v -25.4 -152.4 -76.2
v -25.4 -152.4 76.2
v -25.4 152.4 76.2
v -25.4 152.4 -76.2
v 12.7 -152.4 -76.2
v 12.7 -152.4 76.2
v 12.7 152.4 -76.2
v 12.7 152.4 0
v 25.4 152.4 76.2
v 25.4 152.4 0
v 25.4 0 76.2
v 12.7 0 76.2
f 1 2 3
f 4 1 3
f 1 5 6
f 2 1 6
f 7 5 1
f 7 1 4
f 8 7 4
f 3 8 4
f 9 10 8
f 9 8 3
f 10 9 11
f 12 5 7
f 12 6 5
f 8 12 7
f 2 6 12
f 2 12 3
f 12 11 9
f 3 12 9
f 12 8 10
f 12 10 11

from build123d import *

# Parameters (mm, degrees)
F0_W     = 304.8
F0_H     = 152.4
F1_DEPTH = 6.35
F3_DEPTH = 6.35
F5_DEPTH = 25.399999693
F6_DEPTH = 25.4


with BuildPart() as f1:
    # F0 (on Right) → F1 (new body)
    with BuildSketch(Plane.YZ):
        Rectangle(F0_W, F0_H)
    extrude(amount=F1_DEPTH)

    # F2 (on face) → F3 (join)
    with BuildSketch(Plane.YZ.offset(6.35)):
        Polygon((-152.4, -76.2), (152.4, -76.2), (152.4, 0), (0, 76.2), (-152.4, 76.2), align=None)
    extrude(amount=F3_DEPTH)

    # F4 (on face) → F5 (join)
    with BuildSketch(Plane(origin=(0, 0, 0), x_dir=(0, -1, 0), z_dir=(-1, 0, 0))):
        Polygon((-152.4, 76.2), (-152.4, 0), (0, 76.2), align=None)
    extrude(amount=-F5_DEPTH)

    # F6 (add): a face of the model
    f6_faces = [f1.faces().sort_by_distance(p)[0] for p in [
        (0, 0, 0),
    ]]
    extrude(f6_faces, amount=F6_DEPTH)


solid = f1.part
